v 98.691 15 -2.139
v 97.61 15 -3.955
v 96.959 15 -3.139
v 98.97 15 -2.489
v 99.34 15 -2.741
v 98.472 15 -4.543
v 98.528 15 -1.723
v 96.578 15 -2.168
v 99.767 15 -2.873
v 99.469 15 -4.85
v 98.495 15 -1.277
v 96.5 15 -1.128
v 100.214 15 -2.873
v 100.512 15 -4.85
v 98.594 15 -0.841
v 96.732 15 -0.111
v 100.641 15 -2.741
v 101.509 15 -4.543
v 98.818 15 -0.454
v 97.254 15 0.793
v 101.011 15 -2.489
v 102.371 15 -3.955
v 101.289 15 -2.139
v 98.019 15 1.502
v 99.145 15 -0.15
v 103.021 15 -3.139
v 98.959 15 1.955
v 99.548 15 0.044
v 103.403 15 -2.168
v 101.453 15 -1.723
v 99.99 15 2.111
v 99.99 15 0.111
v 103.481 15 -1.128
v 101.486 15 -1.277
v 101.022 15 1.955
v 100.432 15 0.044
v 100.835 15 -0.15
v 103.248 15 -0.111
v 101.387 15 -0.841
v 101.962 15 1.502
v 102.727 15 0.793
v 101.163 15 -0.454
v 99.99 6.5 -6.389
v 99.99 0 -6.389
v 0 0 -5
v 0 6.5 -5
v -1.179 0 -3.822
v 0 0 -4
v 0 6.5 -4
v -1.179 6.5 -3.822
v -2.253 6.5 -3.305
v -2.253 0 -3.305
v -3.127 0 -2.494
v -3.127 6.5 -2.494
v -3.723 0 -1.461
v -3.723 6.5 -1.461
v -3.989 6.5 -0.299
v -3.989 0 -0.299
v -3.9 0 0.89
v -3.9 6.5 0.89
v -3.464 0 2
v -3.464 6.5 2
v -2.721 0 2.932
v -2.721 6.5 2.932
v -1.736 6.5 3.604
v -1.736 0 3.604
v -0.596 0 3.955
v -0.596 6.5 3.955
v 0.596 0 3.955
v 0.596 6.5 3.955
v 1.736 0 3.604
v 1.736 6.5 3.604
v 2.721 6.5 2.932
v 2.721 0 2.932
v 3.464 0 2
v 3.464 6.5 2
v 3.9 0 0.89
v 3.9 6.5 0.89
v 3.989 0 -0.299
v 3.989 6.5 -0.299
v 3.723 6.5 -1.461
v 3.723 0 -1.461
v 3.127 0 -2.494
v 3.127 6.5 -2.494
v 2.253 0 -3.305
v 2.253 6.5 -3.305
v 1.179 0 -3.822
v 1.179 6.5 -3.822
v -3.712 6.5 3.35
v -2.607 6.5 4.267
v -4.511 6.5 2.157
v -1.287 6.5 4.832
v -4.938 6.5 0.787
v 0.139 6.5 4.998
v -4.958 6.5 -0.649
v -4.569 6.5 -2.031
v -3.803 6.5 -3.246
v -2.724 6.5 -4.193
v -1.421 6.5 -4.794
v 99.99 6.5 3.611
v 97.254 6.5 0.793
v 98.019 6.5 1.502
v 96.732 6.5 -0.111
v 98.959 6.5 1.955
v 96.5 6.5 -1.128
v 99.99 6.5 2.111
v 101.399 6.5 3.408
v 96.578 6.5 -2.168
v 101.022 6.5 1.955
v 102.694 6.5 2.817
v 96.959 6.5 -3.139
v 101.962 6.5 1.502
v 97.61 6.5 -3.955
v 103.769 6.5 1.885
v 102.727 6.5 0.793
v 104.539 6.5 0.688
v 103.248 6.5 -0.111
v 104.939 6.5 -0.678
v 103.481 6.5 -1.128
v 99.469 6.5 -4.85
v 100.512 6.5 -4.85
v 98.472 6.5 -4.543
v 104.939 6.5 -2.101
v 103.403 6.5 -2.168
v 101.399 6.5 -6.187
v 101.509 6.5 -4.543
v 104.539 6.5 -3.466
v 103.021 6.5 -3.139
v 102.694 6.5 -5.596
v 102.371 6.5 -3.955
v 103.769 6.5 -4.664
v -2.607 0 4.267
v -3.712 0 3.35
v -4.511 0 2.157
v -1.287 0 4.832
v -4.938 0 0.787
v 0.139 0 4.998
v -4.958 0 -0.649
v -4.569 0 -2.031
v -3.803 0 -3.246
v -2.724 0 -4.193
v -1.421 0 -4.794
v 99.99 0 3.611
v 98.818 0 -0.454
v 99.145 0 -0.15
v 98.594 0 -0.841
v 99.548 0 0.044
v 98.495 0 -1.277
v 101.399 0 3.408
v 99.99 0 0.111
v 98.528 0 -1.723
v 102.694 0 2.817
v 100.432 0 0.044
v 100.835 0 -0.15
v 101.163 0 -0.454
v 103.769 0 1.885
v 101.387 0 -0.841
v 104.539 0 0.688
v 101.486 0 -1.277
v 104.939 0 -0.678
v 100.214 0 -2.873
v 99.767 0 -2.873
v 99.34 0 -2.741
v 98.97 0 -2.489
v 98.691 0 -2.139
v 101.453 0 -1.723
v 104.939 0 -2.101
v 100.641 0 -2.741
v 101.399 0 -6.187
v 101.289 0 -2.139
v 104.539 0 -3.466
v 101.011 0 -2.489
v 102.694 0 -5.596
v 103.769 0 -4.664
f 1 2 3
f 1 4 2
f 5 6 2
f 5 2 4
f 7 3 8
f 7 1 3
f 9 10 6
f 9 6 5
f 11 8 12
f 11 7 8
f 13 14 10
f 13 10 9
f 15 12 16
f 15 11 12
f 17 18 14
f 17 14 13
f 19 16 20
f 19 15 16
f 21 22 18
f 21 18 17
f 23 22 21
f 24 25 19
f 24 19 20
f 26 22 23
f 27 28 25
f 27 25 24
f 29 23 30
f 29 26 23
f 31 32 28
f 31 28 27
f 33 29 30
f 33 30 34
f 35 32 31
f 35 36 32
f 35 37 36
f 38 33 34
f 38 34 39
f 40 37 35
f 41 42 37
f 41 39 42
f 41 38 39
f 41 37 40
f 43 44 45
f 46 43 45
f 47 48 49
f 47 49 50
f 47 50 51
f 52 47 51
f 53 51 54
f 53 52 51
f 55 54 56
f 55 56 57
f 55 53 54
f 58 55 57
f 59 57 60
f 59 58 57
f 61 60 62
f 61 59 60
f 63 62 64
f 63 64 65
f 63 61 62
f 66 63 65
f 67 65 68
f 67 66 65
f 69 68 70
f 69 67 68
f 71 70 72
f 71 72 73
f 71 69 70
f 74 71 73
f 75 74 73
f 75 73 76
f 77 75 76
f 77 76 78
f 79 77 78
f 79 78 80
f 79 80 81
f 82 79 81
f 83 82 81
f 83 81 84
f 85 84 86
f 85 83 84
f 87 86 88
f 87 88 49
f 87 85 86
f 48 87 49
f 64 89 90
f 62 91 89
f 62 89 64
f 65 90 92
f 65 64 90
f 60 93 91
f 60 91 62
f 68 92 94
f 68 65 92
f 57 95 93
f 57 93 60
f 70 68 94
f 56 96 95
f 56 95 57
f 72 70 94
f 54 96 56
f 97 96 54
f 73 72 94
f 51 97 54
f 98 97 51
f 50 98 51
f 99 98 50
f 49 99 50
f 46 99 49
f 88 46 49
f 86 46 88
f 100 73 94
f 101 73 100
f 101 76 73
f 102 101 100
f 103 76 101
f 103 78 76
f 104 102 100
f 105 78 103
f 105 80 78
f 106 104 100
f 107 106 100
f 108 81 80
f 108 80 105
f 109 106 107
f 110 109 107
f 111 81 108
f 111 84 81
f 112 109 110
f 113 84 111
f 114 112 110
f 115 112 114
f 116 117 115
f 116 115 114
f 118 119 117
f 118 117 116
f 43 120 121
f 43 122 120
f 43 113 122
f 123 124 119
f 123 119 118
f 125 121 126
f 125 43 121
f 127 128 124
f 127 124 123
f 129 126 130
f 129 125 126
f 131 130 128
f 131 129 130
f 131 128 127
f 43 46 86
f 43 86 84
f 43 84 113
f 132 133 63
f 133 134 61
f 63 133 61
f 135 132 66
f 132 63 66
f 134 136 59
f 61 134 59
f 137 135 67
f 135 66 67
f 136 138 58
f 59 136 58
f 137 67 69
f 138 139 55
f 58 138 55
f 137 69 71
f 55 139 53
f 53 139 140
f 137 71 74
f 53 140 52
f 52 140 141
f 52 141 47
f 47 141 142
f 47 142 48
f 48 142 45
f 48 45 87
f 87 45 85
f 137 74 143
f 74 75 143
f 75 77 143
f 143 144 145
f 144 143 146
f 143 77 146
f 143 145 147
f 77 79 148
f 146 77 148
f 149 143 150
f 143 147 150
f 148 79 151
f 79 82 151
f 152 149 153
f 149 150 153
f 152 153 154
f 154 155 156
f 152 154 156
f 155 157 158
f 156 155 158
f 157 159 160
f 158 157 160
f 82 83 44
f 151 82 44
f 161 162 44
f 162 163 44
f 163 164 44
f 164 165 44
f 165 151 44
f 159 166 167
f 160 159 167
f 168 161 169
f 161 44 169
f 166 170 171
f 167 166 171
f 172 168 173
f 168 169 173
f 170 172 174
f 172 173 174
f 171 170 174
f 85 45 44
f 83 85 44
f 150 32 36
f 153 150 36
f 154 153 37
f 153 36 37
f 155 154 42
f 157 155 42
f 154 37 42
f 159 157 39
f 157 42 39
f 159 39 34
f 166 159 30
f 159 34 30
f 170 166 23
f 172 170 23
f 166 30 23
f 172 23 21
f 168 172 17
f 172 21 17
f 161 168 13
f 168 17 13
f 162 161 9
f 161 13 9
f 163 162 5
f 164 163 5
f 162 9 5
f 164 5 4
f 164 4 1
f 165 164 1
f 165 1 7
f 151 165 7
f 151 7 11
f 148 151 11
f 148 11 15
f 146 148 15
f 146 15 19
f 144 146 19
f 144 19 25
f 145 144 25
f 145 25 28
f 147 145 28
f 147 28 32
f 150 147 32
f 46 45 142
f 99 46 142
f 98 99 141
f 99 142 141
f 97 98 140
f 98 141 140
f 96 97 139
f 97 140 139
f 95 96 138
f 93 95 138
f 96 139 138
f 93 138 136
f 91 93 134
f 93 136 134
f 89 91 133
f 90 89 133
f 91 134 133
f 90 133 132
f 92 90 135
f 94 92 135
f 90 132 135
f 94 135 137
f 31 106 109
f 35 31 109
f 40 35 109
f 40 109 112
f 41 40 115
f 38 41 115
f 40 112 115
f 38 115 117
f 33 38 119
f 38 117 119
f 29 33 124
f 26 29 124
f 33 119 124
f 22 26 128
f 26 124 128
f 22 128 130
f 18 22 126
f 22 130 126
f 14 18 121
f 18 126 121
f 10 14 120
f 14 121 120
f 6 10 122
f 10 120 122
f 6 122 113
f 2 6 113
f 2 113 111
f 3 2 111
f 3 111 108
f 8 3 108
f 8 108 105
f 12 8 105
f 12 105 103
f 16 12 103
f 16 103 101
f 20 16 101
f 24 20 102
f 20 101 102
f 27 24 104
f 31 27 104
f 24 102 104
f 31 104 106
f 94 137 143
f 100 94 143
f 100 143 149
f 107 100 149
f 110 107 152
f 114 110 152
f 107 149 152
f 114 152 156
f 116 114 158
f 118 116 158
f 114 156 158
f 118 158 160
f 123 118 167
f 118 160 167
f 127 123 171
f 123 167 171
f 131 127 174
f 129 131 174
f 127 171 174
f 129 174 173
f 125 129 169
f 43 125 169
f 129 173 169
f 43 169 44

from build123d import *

# Parameters (mm, degrees)
SKETCH_1_R          = 4
EXTRUDE_1_DEPTH     = 6.5
SKETCH_2_R          = 3.5
EXTRUDE_2_DEPTH     = 8.5
SKETCH_3_R          = 1.5
CUT_EXTRUDE_1_DEPTH = 107.248752968


with BuildPart() as part:
    # 草图1 → 凸台-拉伸1 (new body)
    with BuildSketch(Plane(origin=(0, 0, 0), x_dir=(1, 0, 0), z_dir=(0, 1, 0))):
        with BuildLine():
            ThreePointArc((0, 5), (-4.999517366, -0.06947017), (0.138926929, -4.998069558))
            Line((0.138926929, -4.998069558), (99.990347325, -3.61059659))
            ThreePointArc((99.990347325, -3.61059659), (104.990347325, 1.38940341), (99.990347325, 6.38940341))
            Line((99.990347325, 6.38940341), (0, 5))
        make_face()
        with Locations(Location((0, 0, 0), (0, 0, 90))):
            Circle(SKETCH_1_R, mode=Mode.SUBTRACT)
    extrude(amount=EXTRUDE_1_DEPTH)

    # 草图2 → 凸台-拉伸2 (add)
    with BuildSketch(Plane(origin=(0, 6.5, 0), x_dir=(1, 0, 0), z_dir=(0, 1, 0))):
        with Locations(Location((99.990347325, 1.38940341, 0), (0, 0, 270))):
            Circle(SKETCH_2_R)
    extrude(amount=EXTRUDE_2_DEPTH)

    # 草图3 → 切除-拉伸1 (cut, through all)
    with BuildSketch(Plane(origin=(0, 15, 0), x_dir=(1, 0, 0), z_dir=(0, 1, 0))):
        with Locations(Location((99.990347325, 1.38940341, 0), (0, 0, 270))):
            Circle(SKETCH_3_R)
    extrude(amount=-CUT_EXTRUDE_1_DEPTH, mode=Mode.SUBTRACT)


solid = part.part
